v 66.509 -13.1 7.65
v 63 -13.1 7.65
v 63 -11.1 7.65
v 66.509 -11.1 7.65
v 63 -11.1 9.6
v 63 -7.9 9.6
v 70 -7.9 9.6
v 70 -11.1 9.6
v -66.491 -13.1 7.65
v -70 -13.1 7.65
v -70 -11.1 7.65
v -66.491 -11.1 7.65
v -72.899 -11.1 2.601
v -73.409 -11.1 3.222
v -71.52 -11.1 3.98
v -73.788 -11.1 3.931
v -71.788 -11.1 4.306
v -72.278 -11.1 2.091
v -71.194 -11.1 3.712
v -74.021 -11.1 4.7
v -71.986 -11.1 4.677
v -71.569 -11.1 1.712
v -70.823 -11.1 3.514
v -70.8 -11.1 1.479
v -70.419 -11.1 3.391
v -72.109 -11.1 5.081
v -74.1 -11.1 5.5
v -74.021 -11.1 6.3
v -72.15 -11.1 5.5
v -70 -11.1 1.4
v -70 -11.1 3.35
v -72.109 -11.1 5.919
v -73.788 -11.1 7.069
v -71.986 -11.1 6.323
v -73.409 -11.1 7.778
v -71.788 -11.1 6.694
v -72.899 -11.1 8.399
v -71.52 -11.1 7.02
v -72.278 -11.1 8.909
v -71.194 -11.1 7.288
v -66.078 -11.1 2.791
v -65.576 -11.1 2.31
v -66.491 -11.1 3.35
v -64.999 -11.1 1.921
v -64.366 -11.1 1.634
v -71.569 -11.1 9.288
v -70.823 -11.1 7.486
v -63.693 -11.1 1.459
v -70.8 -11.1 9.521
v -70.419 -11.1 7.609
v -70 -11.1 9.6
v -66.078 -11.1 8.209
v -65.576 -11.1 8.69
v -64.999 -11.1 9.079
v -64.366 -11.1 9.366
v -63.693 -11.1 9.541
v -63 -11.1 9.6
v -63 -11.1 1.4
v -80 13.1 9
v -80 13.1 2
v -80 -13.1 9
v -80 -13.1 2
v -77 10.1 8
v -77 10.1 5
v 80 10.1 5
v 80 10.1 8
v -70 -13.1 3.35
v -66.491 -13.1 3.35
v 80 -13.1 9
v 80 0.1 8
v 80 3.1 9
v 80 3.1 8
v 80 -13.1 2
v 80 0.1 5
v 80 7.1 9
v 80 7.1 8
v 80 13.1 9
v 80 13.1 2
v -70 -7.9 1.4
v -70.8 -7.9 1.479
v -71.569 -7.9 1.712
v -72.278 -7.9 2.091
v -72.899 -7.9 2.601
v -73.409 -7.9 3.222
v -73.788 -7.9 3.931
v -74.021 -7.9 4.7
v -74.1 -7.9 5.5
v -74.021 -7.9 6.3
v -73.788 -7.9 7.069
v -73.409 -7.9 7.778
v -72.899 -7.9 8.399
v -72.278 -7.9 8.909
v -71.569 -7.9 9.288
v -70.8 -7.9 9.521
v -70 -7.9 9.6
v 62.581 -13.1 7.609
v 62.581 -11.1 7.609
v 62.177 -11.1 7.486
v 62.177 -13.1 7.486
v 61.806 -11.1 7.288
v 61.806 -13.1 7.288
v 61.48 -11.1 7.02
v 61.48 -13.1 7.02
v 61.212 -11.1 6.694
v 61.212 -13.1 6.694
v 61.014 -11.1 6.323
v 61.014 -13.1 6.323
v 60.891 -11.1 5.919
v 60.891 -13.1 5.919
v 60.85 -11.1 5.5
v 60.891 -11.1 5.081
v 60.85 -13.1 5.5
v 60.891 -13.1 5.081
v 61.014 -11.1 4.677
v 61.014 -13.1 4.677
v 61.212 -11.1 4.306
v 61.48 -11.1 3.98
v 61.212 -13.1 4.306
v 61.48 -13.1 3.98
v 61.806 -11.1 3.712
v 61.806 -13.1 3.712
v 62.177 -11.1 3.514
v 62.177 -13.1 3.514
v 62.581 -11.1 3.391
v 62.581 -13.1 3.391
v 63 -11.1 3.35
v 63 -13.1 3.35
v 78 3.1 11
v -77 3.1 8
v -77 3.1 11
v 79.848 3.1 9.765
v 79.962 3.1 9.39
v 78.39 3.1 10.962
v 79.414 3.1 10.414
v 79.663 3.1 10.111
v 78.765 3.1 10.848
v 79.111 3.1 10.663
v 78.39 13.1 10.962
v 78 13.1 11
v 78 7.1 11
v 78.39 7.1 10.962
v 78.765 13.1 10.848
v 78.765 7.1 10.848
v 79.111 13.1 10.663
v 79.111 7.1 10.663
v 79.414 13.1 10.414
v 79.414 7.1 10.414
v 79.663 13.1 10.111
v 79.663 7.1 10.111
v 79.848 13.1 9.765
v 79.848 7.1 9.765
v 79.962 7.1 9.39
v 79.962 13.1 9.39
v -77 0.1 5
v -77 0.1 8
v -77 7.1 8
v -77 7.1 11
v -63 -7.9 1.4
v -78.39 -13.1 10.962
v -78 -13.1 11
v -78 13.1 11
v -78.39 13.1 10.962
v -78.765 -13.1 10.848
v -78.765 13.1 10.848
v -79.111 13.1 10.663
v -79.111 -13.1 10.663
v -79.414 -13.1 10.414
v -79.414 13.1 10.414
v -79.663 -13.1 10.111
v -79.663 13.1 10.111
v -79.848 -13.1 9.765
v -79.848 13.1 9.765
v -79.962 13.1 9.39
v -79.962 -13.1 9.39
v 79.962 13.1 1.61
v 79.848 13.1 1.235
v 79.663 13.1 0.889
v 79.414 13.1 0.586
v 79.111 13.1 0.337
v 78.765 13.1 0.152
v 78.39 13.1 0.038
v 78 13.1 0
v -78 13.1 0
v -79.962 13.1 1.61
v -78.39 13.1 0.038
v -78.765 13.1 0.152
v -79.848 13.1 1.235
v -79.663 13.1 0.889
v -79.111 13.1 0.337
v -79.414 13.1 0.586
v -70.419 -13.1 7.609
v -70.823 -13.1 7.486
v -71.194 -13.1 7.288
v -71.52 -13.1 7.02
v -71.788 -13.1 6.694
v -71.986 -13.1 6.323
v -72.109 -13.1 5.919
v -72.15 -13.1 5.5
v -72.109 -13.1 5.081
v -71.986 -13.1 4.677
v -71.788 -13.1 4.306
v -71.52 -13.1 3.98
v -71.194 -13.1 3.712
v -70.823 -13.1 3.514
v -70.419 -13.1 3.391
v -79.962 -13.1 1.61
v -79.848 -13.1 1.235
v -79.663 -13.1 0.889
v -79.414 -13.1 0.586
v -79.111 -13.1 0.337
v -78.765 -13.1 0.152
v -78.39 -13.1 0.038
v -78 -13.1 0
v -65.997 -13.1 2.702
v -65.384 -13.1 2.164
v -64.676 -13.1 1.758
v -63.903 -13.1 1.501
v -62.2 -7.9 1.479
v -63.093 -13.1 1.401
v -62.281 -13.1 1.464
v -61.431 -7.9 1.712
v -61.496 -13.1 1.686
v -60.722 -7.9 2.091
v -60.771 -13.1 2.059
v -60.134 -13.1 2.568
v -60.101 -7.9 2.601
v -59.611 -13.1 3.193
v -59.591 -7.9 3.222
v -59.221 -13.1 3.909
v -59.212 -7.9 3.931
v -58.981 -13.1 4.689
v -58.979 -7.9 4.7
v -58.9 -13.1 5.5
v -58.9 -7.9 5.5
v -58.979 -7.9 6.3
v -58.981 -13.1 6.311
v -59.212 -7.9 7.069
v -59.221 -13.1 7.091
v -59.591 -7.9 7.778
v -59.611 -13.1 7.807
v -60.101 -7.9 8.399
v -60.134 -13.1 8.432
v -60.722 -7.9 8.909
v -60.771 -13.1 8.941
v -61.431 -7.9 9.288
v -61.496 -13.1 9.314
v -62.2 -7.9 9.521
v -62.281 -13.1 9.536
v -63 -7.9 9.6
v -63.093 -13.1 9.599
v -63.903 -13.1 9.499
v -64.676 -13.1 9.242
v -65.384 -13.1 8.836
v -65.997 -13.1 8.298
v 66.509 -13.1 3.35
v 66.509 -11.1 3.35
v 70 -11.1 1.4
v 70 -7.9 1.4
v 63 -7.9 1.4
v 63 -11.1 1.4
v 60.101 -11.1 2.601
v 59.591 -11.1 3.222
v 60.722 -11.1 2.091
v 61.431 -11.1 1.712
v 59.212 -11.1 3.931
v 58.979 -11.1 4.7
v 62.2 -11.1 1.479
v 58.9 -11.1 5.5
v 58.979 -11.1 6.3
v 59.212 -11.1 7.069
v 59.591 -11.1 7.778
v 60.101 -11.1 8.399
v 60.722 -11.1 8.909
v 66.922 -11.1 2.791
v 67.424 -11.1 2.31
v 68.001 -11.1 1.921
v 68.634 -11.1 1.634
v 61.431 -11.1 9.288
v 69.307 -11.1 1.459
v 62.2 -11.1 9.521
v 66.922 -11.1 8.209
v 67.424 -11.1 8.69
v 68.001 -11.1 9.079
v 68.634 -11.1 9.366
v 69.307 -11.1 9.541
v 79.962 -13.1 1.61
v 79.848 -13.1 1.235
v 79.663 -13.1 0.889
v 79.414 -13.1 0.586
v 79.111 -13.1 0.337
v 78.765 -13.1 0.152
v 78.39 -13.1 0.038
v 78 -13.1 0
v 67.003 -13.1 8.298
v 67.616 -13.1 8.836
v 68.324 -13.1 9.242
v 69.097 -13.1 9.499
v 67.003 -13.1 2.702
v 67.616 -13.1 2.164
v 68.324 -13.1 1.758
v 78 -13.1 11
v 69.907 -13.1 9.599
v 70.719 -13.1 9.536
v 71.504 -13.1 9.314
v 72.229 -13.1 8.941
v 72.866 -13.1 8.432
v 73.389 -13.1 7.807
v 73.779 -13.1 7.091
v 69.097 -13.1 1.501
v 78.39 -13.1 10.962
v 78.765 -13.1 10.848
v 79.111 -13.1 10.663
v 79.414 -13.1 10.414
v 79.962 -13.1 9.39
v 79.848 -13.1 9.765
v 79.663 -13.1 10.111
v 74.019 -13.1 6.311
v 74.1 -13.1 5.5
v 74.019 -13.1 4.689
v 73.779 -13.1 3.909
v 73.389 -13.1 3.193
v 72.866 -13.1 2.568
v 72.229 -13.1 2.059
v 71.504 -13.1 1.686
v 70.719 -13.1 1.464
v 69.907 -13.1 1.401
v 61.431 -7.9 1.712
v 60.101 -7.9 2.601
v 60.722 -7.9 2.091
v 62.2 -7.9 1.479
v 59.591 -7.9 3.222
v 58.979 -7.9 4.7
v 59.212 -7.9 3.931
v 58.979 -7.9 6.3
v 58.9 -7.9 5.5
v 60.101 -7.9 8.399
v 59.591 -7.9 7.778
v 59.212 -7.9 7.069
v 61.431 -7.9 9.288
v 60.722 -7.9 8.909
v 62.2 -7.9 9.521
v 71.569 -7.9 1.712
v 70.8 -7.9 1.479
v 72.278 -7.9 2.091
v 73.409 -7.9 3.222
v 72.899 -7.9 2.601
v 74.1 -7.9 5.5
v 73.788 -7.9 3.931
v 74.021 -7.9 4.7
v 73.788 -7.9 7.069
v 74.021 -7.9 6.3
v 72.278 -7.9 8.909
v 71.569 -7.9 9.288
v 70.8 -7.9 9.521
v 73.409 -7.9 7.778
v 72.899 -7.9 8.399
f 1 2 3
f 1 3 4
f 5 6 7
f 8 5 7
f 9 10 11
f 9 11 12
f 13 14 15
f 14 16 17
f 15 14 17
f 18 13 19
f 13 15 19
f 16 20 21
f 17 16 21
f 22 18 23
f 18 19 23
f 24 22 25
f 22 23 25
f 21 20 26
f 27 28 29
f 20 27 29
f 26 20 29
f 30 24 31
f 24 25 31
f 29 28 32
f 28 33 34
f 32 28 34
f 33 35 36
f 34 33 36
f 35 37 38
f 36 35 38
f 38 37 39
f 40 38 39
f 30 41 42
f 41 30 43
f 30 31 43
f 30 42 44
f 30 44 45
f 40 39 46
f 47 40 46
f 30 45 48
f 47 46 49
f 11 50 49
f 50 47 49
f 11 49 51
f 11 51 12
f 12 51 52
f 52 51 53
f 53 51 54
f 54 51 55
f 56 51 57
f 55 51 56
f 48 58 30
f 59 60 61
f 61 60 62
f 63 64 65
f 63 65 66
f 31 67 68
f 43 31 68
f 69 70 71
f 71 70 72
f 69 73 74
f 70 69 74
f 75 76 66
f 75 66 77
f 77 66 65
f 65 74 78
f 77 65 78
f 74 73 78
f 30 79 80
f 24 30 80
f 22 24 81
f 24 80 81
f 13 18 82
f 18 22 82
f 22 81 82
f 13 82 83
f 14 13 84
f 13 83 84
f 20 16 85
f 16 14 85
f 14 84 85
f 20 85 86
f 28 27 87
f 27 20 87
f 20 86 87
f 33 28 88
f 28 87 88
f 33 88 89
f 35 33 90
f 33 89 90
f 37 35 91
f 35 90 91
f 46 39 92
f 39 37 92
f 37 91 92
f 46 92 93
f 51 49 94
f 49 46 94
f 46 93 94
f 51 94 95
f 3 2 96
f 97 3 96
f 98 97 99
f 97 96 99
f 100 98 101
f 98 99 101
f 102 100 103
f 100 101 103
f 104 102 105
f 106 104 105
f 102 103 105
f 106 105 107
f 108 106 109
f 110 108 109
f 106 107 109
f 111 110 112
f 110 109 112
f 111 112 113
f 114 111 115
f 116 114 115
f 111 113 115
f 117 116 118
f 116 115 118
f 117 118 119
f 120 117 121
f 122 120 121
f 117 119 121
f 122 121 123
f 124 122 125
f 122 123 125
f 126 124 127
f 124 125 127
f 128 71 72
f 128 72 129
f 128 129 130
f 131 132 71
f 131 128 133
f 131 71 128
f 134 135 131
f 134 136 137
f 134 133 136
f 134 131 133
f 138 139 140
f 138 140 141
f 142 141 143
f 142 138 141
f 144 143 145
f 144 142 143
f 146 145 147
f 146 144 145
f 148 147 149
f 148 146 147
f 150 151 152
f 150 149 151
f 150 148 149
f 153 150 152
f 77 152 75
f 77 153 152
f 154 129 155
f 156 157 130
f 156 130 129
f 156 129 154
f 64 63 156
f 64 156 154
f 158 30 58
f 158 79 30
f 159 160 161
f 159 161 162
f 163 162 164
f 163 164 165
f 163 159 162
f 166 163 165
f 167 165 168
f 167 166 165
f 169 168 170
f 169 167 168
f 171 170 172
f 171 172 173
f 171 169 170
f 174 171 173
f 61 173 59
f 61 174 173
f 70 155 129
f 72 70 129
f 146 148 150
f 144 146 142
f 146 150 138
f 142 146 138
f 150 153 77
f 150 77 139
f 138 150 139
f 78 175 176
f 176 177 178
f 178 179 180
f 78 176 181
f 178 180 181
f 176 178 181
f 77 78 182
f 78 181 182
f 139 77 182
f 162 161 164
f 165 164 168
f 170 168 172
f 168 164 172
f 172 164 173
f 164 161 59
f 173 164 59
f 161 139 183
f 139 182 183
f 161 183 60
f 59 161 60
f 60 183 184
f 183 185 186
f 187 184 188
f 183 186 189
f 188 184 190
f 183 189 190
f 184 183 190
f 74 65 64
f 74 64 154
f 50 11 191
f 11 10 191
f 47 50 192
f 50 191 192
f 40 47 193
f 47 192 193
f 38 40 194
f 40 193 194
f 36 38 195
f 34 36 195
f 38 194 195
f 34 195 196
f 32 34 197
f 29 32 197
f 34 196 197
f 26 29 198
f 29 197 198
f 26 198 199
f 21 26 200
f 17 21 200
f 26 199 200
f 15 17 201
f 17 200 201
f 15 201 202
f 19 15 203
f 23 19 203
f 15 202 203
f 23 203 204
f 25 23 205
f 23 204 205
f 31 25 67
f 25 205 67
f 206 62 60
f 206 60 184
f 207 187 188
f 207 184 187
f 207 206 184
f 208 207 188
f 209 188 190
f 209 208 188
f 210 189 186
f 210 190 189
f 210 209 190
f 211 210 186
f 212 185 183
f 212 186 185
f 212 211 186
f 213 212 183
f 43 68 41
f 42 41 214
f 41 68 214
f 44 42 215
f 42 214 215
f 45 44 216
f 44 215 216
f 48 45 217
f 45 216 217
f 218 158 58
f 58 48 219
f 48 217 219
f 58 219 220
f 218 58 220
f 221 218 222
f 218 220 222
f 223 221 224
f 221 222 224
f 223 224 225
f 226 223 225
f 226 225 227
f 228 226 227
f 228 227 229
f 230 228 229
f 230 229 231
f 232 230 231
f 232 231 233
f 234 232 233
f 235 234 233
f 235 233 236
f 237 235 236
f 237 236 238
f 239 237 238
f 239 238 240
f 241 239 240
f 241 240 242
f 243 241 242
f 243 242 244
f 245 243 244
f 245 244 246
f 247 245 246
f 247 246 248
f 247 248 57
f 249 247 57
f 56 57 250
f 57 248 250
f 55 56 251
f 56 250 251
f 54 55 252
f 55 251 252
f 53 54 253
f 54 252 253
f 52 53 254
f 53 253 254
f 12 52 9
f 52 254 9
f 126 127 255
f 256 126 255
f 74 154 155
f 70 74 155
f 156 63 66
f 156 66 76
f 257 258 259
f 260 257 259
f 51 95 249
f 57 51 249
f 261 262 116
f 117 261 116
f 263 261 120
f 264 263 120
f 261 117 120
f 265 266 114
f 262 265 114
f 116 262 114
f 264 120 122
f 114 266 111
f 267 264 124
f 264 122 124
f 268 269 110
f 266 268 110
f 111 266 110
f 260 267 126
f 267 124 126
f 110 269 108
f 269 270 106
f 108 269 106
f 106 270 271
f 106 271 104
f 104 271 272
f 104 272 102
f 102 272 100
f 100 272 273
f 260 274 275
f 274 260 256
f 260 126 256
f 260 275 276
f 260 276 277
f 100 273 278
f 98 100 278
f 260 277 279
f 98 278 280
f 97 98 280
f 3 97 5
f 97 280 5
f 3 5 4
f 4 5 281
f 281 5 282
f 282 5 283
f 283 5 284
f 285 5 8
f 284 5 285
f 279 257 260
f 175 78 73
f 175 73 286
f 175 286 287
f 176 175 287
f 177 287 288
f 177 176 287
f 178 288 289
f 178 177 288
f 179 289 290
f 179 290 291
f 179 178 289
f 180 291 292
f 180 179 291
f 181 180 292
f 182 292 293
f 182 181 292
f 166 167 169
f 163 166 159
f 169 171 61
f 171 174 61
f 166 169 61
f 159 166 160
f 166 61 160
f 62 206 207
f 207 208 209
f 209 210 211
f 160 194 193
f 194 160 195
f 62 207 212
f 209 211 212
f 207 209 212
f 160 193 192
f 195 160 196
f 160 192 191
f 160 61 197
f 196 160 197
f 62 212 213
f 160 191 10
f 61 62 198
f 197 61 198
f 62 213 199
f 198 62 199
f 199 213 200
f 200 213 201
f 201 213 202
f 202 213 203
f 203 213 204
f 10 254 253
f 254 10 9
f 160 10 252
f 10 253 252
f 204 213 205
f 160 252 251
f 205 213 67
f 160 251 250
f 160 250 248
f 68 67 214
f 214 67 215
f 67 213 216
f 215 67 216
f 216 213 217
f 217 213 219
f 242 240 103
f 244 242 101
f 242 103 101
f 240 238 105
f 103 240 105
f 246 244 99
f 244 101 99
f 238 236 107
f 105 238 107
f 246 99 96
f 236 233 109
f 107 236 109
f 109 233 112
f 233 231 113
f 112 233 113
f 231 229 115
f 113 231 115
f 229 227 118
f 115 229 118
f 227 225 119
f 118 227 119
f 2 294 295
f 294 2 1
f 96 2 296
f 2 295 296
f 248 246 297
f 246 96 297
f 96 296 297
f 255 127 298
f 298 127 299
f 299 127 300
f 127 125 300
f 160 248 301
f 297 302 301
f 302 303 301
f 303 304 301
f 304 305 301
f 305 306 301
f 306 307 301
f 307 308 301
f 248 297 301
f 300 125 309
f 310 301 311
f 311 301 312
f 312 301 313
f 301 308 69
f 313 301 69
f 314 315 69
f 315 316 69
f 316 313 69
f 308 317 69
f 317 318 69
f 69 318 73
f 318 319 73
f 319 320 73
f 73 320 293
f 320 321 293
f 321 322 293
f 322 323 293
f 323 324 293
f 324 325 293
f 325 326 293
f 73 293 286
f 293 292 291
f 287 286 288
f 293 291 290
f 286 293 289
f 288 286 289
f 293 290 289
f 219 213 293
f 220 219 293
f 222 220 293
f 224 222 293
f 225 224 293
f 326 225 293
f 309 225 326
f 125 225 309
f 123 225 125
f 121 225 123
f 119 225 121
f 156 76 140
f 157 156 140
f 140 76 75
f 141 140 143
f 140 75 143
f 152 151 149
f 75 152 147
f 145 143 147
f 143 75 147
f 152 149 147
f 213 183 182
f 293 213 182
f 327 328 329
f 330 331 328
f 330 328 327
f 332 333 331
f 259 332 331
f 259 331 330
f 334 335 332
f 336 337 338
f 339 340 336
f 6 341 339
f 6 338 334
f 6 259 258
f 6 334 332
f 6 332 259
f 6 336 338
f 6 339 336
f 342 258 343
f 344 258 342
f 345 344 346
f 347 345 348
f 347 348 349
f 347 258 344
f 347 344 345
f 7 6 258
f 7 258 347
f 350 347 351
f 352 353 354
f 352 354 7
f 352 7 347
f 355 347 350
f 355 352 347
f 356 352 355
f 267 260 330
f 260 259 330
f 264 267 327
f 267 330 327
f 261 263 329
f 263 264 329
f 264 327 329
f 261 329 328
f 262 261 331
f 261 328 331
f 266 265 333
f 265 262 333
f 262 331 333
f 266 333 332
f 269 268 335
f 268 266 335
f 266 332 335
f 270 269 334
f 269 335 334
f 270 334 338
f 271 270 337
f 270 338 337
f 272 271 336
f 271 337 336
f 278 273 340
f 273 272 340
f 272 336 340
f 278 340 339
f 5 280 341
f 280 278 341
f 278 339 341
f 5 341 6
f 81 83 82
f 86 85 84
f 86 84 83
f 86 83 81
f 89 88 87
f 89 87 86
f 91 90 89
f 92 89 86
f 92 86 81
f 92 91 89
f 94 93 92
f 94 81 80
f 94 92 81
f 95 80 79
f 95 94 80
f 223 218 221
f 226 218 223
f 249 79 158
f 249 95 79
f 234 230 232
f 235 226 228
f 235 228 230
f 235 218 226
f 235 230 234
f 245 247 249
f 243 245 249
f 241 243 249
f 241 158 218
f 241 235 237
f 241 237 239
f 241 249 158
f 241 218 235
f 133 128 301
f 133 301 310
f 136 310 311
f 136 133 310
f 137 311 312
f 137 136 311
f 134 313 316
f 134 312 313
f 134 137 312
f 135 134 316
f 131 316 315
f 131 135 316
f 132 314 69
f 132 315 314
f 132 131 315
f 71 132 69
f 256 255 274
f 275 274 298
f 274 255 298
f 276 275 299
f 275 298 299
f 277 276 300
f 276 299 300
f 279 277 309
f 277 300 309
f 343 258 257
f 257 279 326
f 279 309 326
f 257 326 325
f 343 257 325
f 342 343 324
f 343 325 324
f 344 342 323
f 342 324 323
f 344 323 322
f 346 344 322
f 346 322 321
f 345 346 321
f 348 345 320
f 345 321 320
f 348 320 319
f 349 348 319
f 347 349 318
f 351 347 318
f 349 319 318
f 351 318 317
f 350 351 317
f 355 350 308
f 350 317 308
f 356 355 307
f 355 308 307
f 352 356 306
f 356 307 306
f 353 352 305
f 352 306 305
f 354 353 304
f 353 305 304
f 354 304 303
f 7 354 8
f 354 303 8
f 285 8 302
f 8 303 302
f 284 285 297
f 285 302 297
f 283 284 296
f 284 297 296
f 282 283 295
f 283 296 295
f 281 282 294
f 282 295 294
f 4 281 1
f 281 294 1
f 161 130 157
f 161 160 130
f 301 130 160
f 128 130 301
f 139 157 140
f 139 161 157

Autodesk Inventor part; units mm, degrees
ref_plane "YZ Plane" through (0, 0, 0) normal (1, 0, 0) x (0, 1, 0)
ref_plane "XZ Plane" through (0, 0, 0) normal (0, 1, 0) x (-1, 0, 0)
ref_plane "XY Plane" through (0, 0, 0) normal (0, 0, 1) x (1, 0, 0)
sketch "Sketch1" plane through (0, 0, 0) normal (0, 0, 1) x (1, 0, 0)
  line L0 (80, 13.1) -> (-80, 13.1)
  line L1 (-80, 13.1) -> (-80, -13.1)
  line L2 (-80, -13.1) -> (80, -13.1)
  line L3 (80, -13.1) -> (80, 13.1)
  line L4 (80, 13.1) -> (-80, -13.1) construction
  line L5 (-80, 13.1) -> (80, -13.1) construction
  point P0 (0, 0)
  dimension "d0" = 160
  dimension "d1" = 26.2
extrude "Extrusion1" add sketch "Sketch1" along normal blind 11
sketch "Sketch2" plane through (80, -13.1, 0) normal (1, 0, 0) x (0, 0, -1)
  line L0 (0, 0) -> (0, 26.2) projected
  line L1 (0, 26.2) -> (-11, 26.2) projected
  line L2 (-11, 0) -> (-11, 26.2) projected
  line L3 (0, 0) -> (-11, 0) projected
  line L4 (-11, 26.2) -> (-11, 0) projected
  line L5 (-11, 26.2) -> (-5, 26.2)
  line L6 (-5, 26.2) -> (-5, 23.2)
  line L7 (-5, 23.2) -> (-11, 23.2)
  line L8 (-11, 23.2) -> (-11, 26.2)
  line L9 (-11, 23.2) -> (-8, 23.2)
  line L10 (-8, 23.2) -> (-8, 20.2)
  line L11 (-8, 20.2) -> (-11, 20.2)
  line L12 (-11, 20.2) -> (-11, 23.2)
  line L13 (-11, 26.2) -> (-5, 26.2)
  line L14 (-5, 26.2) -> (-5, 10.2)
  line L15 (-5, 10.2) -> (-11, 10.2)
  line L16 (-11, 10.2) -> (-11, 26.2)
  line L17 (-11, 10.2) -> (-5, 10.2)
  line L18 (-5, 10.2) -> (-5, 13.2)
  line L19 (-5, 13.2) -> (-11, 13.2)
  line L20 (-11, 13.2) -> (-11, 10.2)
  line L21 (-11, 13.2) -> (-8, 13.2)
  line L22 (-8, 13.2) -> (-8, 16.2)
  line L23 (-8, 16.2) -> (-11, 16.2)
  line L24 (-11, 16.2) -> (-11, 13.2)
  point P0 (0, 13.1)
  point P1 (-11, 20.2)
  dimension "d4" = 6
  dimension "d5" = 3
  dimension "d6" = 3
  dimension "d7" = 3
  dimension "d8" = 16
  dimension "d9" = 3
  dimension "d10" = 3
  dimension "d11" = 3
extrude "Extrusion2" cut sketch "Sketch2" against normal blind 157 contours L14 L19 L22 L23 L2 L11 L10 L7
fillet "Fillet1" radius 2 5 edges at (80, 10.1, 11) (80, -5, 11) (-80, 0, 11) (80, 0, 0) (-80, 0, 0)
sketch "Sketch4" plane through (-78, -13.1, 0) normal (0, -1, 0) x (1, 0, 0)
  arc A0 (-2, 2) -> (0, 0) centre (0, 2) ccw projected
  line L0 (0, 0) -> (156, 0) projected
  arc A1 (156, 0) -> (158, 2) centre (156, 2) ccw projected
  line L1 (158, 2) -> (158, 9) projected
  arc A2 (158, 9) -> (156, 11) centre (156, 9) ccw projected
  line L2 (0, 11) -> (156, 11) projected
  arc A3 (0, 11) -> (-2, 9) centre (0, 9) ccw projected
  line L3 (-2, 2) -> (-2, 9) projected
  circle A4 centre (148, 5.5) radius 4.1
  circle A5 centre (141, 5.5) radius 2.15
  line L4 (141, 7.65) -> (144.5089, 7.65)
  line L5 (141, 3.35) -> (144.5089, 3.35)
  circle A6 centre (15, 5.5) radius 4.1
  circle A7 centre (8, 5.5) radius 2.15
  line L6 (8, 3.35) -> (11.5089, 3.35)
  line L7 (8, 7.65) -> (11.5089, 7.65)
  point P0 (78, 0)
  point P1 (158, 5.5)
  point P2 (12.2407, 8.5325)
  point P3 (8.4381, 3.3951)
  point P4 (11.1965, 3.9692)
  point P5 (-2, 5.5)
  dimension "d19" = 8.2
  dimension "d20" = 4.3
  dimension "d21" = 7
  dimension "d22" = 0
  dimension "d23" = 10
  dimension "d24" = 8.2
  dimension "d25" = 4.3
  dimension "d26" = 7
  dimension "d27" = 10
  dimension "d28" = 0
  dimension "d40" = 0
extrude "Extrusion4" cut sketch "Sketch4" against normal blind 5.2 contours A4 | A4 L5 A5 L4 | A5 | A6 | A6 L6 A7 L7 | A7
sketch "Sketch5" plane through (-78, -13.1, 0) normal (0, -1, 0) x (1, 0, 0)
  arc A0 (8, 7.65) -> (8, 3.35) centre (8, 5.5) ccw projected
  arc A1 (11.5089, 3.35) -> (11.5089, 7.65) centre (15, 5.5) ccw projected
  arc A2 (141, 7.65) -> (141, 3.35) centre (141, 5.5) ccw projected
  line L0 (141, 7.65) -> (144.5089, 7.65) projected
  arc A3 (144.5089, 3.35) -> (144.5089, 7.65) centre (148, 5.5) ccw projected
  line L1 (144.5089, 3.35) -> (141, 3.35) projected
  arc A4 (-2, 2) -> (0, 0) centre (0, 2) ccw projected
  line L2 (0, 0) -> (156, 0) projected
  arc A5 (156, 0) -> (158, 2) centre (156, 2) ccw projected
  line L3 (158, 2) -> (158, 9) projected
  arc A6 (158, 9) -> (156, 11) centre (156, 9) ccw projected
  line L4 (0, 11) -> (156, 11) projected
  arc A7 (0, 11) -> (-2, 9) centre (0, 9) ccw projected
  line L5 (-2, 2) -> (-2, 9) projected
  circle A8 centre (8, 5.5) radius 4.1
  line L6 (8, 9.6) -> (15, 9.6)
  line L7 (8, 1.4) -> (15, 1.4)
  arc A9 (11.5089, 3.35) -> (11.5089, 7.65) centre (15, 5.5) ccw projected
  circle A10 centre (141, 5.5) radius 4.1
  line L8 (141, 9.6) -> (148, 9.6)
  line L9 (148, 1.4) -> (141, 1.4)
  line L10 (8, 7.65) -> (11.5089, 7.65) projected
  line L11 (11.5089, 3.35) -> (8, 3.35) projected
  arc A11 (8, 7.65) -> (8, 3.35) centre (8, 5.5) ccw projected
  point P0 (78, 0)
  point P1 (19.1, 5.5)
  point P2 (19.1, 5.5)
  point P3 (5.85, 5.5)
  point P4 (138.85, 5.5)
  point P5 (12.4867, 2.2607)
  point P6 (12.4867, 8.7393)
  point P7 (96.275, 2.2698)
  point P8 (96.275, 8.7302)
  point P9 (5.85, 5.5)
  point P10 (144.4911, 7.65)
  point P11 (144.4911, 3.35)
  point P12 (11.4911, 3.35)
  point P13 (11.4911, 7.65)
  dimension "d32" = 8.2
  dimension "d33" = 0
  dimension "d35" = 8.2
  dimension "d36" = 0
  dimension "d42" = 0
  dimension "d43" = 0
extrude "Extrusion5" cut sketch "Sketch5" along normal blind 3.2 from surface at -5.2 contours L10 A8 L11 A0 | A0 L11 A8 L10 | A8 L6 A1 L10 | L11 A1 L7 A8 | L0 A10 L1 A2 | A2 L1 A10 L0 | A10 L8 A3 L0 | L1 A3 L9 A10
properties part number "module-slot" material "PC/ABS Plastic"
